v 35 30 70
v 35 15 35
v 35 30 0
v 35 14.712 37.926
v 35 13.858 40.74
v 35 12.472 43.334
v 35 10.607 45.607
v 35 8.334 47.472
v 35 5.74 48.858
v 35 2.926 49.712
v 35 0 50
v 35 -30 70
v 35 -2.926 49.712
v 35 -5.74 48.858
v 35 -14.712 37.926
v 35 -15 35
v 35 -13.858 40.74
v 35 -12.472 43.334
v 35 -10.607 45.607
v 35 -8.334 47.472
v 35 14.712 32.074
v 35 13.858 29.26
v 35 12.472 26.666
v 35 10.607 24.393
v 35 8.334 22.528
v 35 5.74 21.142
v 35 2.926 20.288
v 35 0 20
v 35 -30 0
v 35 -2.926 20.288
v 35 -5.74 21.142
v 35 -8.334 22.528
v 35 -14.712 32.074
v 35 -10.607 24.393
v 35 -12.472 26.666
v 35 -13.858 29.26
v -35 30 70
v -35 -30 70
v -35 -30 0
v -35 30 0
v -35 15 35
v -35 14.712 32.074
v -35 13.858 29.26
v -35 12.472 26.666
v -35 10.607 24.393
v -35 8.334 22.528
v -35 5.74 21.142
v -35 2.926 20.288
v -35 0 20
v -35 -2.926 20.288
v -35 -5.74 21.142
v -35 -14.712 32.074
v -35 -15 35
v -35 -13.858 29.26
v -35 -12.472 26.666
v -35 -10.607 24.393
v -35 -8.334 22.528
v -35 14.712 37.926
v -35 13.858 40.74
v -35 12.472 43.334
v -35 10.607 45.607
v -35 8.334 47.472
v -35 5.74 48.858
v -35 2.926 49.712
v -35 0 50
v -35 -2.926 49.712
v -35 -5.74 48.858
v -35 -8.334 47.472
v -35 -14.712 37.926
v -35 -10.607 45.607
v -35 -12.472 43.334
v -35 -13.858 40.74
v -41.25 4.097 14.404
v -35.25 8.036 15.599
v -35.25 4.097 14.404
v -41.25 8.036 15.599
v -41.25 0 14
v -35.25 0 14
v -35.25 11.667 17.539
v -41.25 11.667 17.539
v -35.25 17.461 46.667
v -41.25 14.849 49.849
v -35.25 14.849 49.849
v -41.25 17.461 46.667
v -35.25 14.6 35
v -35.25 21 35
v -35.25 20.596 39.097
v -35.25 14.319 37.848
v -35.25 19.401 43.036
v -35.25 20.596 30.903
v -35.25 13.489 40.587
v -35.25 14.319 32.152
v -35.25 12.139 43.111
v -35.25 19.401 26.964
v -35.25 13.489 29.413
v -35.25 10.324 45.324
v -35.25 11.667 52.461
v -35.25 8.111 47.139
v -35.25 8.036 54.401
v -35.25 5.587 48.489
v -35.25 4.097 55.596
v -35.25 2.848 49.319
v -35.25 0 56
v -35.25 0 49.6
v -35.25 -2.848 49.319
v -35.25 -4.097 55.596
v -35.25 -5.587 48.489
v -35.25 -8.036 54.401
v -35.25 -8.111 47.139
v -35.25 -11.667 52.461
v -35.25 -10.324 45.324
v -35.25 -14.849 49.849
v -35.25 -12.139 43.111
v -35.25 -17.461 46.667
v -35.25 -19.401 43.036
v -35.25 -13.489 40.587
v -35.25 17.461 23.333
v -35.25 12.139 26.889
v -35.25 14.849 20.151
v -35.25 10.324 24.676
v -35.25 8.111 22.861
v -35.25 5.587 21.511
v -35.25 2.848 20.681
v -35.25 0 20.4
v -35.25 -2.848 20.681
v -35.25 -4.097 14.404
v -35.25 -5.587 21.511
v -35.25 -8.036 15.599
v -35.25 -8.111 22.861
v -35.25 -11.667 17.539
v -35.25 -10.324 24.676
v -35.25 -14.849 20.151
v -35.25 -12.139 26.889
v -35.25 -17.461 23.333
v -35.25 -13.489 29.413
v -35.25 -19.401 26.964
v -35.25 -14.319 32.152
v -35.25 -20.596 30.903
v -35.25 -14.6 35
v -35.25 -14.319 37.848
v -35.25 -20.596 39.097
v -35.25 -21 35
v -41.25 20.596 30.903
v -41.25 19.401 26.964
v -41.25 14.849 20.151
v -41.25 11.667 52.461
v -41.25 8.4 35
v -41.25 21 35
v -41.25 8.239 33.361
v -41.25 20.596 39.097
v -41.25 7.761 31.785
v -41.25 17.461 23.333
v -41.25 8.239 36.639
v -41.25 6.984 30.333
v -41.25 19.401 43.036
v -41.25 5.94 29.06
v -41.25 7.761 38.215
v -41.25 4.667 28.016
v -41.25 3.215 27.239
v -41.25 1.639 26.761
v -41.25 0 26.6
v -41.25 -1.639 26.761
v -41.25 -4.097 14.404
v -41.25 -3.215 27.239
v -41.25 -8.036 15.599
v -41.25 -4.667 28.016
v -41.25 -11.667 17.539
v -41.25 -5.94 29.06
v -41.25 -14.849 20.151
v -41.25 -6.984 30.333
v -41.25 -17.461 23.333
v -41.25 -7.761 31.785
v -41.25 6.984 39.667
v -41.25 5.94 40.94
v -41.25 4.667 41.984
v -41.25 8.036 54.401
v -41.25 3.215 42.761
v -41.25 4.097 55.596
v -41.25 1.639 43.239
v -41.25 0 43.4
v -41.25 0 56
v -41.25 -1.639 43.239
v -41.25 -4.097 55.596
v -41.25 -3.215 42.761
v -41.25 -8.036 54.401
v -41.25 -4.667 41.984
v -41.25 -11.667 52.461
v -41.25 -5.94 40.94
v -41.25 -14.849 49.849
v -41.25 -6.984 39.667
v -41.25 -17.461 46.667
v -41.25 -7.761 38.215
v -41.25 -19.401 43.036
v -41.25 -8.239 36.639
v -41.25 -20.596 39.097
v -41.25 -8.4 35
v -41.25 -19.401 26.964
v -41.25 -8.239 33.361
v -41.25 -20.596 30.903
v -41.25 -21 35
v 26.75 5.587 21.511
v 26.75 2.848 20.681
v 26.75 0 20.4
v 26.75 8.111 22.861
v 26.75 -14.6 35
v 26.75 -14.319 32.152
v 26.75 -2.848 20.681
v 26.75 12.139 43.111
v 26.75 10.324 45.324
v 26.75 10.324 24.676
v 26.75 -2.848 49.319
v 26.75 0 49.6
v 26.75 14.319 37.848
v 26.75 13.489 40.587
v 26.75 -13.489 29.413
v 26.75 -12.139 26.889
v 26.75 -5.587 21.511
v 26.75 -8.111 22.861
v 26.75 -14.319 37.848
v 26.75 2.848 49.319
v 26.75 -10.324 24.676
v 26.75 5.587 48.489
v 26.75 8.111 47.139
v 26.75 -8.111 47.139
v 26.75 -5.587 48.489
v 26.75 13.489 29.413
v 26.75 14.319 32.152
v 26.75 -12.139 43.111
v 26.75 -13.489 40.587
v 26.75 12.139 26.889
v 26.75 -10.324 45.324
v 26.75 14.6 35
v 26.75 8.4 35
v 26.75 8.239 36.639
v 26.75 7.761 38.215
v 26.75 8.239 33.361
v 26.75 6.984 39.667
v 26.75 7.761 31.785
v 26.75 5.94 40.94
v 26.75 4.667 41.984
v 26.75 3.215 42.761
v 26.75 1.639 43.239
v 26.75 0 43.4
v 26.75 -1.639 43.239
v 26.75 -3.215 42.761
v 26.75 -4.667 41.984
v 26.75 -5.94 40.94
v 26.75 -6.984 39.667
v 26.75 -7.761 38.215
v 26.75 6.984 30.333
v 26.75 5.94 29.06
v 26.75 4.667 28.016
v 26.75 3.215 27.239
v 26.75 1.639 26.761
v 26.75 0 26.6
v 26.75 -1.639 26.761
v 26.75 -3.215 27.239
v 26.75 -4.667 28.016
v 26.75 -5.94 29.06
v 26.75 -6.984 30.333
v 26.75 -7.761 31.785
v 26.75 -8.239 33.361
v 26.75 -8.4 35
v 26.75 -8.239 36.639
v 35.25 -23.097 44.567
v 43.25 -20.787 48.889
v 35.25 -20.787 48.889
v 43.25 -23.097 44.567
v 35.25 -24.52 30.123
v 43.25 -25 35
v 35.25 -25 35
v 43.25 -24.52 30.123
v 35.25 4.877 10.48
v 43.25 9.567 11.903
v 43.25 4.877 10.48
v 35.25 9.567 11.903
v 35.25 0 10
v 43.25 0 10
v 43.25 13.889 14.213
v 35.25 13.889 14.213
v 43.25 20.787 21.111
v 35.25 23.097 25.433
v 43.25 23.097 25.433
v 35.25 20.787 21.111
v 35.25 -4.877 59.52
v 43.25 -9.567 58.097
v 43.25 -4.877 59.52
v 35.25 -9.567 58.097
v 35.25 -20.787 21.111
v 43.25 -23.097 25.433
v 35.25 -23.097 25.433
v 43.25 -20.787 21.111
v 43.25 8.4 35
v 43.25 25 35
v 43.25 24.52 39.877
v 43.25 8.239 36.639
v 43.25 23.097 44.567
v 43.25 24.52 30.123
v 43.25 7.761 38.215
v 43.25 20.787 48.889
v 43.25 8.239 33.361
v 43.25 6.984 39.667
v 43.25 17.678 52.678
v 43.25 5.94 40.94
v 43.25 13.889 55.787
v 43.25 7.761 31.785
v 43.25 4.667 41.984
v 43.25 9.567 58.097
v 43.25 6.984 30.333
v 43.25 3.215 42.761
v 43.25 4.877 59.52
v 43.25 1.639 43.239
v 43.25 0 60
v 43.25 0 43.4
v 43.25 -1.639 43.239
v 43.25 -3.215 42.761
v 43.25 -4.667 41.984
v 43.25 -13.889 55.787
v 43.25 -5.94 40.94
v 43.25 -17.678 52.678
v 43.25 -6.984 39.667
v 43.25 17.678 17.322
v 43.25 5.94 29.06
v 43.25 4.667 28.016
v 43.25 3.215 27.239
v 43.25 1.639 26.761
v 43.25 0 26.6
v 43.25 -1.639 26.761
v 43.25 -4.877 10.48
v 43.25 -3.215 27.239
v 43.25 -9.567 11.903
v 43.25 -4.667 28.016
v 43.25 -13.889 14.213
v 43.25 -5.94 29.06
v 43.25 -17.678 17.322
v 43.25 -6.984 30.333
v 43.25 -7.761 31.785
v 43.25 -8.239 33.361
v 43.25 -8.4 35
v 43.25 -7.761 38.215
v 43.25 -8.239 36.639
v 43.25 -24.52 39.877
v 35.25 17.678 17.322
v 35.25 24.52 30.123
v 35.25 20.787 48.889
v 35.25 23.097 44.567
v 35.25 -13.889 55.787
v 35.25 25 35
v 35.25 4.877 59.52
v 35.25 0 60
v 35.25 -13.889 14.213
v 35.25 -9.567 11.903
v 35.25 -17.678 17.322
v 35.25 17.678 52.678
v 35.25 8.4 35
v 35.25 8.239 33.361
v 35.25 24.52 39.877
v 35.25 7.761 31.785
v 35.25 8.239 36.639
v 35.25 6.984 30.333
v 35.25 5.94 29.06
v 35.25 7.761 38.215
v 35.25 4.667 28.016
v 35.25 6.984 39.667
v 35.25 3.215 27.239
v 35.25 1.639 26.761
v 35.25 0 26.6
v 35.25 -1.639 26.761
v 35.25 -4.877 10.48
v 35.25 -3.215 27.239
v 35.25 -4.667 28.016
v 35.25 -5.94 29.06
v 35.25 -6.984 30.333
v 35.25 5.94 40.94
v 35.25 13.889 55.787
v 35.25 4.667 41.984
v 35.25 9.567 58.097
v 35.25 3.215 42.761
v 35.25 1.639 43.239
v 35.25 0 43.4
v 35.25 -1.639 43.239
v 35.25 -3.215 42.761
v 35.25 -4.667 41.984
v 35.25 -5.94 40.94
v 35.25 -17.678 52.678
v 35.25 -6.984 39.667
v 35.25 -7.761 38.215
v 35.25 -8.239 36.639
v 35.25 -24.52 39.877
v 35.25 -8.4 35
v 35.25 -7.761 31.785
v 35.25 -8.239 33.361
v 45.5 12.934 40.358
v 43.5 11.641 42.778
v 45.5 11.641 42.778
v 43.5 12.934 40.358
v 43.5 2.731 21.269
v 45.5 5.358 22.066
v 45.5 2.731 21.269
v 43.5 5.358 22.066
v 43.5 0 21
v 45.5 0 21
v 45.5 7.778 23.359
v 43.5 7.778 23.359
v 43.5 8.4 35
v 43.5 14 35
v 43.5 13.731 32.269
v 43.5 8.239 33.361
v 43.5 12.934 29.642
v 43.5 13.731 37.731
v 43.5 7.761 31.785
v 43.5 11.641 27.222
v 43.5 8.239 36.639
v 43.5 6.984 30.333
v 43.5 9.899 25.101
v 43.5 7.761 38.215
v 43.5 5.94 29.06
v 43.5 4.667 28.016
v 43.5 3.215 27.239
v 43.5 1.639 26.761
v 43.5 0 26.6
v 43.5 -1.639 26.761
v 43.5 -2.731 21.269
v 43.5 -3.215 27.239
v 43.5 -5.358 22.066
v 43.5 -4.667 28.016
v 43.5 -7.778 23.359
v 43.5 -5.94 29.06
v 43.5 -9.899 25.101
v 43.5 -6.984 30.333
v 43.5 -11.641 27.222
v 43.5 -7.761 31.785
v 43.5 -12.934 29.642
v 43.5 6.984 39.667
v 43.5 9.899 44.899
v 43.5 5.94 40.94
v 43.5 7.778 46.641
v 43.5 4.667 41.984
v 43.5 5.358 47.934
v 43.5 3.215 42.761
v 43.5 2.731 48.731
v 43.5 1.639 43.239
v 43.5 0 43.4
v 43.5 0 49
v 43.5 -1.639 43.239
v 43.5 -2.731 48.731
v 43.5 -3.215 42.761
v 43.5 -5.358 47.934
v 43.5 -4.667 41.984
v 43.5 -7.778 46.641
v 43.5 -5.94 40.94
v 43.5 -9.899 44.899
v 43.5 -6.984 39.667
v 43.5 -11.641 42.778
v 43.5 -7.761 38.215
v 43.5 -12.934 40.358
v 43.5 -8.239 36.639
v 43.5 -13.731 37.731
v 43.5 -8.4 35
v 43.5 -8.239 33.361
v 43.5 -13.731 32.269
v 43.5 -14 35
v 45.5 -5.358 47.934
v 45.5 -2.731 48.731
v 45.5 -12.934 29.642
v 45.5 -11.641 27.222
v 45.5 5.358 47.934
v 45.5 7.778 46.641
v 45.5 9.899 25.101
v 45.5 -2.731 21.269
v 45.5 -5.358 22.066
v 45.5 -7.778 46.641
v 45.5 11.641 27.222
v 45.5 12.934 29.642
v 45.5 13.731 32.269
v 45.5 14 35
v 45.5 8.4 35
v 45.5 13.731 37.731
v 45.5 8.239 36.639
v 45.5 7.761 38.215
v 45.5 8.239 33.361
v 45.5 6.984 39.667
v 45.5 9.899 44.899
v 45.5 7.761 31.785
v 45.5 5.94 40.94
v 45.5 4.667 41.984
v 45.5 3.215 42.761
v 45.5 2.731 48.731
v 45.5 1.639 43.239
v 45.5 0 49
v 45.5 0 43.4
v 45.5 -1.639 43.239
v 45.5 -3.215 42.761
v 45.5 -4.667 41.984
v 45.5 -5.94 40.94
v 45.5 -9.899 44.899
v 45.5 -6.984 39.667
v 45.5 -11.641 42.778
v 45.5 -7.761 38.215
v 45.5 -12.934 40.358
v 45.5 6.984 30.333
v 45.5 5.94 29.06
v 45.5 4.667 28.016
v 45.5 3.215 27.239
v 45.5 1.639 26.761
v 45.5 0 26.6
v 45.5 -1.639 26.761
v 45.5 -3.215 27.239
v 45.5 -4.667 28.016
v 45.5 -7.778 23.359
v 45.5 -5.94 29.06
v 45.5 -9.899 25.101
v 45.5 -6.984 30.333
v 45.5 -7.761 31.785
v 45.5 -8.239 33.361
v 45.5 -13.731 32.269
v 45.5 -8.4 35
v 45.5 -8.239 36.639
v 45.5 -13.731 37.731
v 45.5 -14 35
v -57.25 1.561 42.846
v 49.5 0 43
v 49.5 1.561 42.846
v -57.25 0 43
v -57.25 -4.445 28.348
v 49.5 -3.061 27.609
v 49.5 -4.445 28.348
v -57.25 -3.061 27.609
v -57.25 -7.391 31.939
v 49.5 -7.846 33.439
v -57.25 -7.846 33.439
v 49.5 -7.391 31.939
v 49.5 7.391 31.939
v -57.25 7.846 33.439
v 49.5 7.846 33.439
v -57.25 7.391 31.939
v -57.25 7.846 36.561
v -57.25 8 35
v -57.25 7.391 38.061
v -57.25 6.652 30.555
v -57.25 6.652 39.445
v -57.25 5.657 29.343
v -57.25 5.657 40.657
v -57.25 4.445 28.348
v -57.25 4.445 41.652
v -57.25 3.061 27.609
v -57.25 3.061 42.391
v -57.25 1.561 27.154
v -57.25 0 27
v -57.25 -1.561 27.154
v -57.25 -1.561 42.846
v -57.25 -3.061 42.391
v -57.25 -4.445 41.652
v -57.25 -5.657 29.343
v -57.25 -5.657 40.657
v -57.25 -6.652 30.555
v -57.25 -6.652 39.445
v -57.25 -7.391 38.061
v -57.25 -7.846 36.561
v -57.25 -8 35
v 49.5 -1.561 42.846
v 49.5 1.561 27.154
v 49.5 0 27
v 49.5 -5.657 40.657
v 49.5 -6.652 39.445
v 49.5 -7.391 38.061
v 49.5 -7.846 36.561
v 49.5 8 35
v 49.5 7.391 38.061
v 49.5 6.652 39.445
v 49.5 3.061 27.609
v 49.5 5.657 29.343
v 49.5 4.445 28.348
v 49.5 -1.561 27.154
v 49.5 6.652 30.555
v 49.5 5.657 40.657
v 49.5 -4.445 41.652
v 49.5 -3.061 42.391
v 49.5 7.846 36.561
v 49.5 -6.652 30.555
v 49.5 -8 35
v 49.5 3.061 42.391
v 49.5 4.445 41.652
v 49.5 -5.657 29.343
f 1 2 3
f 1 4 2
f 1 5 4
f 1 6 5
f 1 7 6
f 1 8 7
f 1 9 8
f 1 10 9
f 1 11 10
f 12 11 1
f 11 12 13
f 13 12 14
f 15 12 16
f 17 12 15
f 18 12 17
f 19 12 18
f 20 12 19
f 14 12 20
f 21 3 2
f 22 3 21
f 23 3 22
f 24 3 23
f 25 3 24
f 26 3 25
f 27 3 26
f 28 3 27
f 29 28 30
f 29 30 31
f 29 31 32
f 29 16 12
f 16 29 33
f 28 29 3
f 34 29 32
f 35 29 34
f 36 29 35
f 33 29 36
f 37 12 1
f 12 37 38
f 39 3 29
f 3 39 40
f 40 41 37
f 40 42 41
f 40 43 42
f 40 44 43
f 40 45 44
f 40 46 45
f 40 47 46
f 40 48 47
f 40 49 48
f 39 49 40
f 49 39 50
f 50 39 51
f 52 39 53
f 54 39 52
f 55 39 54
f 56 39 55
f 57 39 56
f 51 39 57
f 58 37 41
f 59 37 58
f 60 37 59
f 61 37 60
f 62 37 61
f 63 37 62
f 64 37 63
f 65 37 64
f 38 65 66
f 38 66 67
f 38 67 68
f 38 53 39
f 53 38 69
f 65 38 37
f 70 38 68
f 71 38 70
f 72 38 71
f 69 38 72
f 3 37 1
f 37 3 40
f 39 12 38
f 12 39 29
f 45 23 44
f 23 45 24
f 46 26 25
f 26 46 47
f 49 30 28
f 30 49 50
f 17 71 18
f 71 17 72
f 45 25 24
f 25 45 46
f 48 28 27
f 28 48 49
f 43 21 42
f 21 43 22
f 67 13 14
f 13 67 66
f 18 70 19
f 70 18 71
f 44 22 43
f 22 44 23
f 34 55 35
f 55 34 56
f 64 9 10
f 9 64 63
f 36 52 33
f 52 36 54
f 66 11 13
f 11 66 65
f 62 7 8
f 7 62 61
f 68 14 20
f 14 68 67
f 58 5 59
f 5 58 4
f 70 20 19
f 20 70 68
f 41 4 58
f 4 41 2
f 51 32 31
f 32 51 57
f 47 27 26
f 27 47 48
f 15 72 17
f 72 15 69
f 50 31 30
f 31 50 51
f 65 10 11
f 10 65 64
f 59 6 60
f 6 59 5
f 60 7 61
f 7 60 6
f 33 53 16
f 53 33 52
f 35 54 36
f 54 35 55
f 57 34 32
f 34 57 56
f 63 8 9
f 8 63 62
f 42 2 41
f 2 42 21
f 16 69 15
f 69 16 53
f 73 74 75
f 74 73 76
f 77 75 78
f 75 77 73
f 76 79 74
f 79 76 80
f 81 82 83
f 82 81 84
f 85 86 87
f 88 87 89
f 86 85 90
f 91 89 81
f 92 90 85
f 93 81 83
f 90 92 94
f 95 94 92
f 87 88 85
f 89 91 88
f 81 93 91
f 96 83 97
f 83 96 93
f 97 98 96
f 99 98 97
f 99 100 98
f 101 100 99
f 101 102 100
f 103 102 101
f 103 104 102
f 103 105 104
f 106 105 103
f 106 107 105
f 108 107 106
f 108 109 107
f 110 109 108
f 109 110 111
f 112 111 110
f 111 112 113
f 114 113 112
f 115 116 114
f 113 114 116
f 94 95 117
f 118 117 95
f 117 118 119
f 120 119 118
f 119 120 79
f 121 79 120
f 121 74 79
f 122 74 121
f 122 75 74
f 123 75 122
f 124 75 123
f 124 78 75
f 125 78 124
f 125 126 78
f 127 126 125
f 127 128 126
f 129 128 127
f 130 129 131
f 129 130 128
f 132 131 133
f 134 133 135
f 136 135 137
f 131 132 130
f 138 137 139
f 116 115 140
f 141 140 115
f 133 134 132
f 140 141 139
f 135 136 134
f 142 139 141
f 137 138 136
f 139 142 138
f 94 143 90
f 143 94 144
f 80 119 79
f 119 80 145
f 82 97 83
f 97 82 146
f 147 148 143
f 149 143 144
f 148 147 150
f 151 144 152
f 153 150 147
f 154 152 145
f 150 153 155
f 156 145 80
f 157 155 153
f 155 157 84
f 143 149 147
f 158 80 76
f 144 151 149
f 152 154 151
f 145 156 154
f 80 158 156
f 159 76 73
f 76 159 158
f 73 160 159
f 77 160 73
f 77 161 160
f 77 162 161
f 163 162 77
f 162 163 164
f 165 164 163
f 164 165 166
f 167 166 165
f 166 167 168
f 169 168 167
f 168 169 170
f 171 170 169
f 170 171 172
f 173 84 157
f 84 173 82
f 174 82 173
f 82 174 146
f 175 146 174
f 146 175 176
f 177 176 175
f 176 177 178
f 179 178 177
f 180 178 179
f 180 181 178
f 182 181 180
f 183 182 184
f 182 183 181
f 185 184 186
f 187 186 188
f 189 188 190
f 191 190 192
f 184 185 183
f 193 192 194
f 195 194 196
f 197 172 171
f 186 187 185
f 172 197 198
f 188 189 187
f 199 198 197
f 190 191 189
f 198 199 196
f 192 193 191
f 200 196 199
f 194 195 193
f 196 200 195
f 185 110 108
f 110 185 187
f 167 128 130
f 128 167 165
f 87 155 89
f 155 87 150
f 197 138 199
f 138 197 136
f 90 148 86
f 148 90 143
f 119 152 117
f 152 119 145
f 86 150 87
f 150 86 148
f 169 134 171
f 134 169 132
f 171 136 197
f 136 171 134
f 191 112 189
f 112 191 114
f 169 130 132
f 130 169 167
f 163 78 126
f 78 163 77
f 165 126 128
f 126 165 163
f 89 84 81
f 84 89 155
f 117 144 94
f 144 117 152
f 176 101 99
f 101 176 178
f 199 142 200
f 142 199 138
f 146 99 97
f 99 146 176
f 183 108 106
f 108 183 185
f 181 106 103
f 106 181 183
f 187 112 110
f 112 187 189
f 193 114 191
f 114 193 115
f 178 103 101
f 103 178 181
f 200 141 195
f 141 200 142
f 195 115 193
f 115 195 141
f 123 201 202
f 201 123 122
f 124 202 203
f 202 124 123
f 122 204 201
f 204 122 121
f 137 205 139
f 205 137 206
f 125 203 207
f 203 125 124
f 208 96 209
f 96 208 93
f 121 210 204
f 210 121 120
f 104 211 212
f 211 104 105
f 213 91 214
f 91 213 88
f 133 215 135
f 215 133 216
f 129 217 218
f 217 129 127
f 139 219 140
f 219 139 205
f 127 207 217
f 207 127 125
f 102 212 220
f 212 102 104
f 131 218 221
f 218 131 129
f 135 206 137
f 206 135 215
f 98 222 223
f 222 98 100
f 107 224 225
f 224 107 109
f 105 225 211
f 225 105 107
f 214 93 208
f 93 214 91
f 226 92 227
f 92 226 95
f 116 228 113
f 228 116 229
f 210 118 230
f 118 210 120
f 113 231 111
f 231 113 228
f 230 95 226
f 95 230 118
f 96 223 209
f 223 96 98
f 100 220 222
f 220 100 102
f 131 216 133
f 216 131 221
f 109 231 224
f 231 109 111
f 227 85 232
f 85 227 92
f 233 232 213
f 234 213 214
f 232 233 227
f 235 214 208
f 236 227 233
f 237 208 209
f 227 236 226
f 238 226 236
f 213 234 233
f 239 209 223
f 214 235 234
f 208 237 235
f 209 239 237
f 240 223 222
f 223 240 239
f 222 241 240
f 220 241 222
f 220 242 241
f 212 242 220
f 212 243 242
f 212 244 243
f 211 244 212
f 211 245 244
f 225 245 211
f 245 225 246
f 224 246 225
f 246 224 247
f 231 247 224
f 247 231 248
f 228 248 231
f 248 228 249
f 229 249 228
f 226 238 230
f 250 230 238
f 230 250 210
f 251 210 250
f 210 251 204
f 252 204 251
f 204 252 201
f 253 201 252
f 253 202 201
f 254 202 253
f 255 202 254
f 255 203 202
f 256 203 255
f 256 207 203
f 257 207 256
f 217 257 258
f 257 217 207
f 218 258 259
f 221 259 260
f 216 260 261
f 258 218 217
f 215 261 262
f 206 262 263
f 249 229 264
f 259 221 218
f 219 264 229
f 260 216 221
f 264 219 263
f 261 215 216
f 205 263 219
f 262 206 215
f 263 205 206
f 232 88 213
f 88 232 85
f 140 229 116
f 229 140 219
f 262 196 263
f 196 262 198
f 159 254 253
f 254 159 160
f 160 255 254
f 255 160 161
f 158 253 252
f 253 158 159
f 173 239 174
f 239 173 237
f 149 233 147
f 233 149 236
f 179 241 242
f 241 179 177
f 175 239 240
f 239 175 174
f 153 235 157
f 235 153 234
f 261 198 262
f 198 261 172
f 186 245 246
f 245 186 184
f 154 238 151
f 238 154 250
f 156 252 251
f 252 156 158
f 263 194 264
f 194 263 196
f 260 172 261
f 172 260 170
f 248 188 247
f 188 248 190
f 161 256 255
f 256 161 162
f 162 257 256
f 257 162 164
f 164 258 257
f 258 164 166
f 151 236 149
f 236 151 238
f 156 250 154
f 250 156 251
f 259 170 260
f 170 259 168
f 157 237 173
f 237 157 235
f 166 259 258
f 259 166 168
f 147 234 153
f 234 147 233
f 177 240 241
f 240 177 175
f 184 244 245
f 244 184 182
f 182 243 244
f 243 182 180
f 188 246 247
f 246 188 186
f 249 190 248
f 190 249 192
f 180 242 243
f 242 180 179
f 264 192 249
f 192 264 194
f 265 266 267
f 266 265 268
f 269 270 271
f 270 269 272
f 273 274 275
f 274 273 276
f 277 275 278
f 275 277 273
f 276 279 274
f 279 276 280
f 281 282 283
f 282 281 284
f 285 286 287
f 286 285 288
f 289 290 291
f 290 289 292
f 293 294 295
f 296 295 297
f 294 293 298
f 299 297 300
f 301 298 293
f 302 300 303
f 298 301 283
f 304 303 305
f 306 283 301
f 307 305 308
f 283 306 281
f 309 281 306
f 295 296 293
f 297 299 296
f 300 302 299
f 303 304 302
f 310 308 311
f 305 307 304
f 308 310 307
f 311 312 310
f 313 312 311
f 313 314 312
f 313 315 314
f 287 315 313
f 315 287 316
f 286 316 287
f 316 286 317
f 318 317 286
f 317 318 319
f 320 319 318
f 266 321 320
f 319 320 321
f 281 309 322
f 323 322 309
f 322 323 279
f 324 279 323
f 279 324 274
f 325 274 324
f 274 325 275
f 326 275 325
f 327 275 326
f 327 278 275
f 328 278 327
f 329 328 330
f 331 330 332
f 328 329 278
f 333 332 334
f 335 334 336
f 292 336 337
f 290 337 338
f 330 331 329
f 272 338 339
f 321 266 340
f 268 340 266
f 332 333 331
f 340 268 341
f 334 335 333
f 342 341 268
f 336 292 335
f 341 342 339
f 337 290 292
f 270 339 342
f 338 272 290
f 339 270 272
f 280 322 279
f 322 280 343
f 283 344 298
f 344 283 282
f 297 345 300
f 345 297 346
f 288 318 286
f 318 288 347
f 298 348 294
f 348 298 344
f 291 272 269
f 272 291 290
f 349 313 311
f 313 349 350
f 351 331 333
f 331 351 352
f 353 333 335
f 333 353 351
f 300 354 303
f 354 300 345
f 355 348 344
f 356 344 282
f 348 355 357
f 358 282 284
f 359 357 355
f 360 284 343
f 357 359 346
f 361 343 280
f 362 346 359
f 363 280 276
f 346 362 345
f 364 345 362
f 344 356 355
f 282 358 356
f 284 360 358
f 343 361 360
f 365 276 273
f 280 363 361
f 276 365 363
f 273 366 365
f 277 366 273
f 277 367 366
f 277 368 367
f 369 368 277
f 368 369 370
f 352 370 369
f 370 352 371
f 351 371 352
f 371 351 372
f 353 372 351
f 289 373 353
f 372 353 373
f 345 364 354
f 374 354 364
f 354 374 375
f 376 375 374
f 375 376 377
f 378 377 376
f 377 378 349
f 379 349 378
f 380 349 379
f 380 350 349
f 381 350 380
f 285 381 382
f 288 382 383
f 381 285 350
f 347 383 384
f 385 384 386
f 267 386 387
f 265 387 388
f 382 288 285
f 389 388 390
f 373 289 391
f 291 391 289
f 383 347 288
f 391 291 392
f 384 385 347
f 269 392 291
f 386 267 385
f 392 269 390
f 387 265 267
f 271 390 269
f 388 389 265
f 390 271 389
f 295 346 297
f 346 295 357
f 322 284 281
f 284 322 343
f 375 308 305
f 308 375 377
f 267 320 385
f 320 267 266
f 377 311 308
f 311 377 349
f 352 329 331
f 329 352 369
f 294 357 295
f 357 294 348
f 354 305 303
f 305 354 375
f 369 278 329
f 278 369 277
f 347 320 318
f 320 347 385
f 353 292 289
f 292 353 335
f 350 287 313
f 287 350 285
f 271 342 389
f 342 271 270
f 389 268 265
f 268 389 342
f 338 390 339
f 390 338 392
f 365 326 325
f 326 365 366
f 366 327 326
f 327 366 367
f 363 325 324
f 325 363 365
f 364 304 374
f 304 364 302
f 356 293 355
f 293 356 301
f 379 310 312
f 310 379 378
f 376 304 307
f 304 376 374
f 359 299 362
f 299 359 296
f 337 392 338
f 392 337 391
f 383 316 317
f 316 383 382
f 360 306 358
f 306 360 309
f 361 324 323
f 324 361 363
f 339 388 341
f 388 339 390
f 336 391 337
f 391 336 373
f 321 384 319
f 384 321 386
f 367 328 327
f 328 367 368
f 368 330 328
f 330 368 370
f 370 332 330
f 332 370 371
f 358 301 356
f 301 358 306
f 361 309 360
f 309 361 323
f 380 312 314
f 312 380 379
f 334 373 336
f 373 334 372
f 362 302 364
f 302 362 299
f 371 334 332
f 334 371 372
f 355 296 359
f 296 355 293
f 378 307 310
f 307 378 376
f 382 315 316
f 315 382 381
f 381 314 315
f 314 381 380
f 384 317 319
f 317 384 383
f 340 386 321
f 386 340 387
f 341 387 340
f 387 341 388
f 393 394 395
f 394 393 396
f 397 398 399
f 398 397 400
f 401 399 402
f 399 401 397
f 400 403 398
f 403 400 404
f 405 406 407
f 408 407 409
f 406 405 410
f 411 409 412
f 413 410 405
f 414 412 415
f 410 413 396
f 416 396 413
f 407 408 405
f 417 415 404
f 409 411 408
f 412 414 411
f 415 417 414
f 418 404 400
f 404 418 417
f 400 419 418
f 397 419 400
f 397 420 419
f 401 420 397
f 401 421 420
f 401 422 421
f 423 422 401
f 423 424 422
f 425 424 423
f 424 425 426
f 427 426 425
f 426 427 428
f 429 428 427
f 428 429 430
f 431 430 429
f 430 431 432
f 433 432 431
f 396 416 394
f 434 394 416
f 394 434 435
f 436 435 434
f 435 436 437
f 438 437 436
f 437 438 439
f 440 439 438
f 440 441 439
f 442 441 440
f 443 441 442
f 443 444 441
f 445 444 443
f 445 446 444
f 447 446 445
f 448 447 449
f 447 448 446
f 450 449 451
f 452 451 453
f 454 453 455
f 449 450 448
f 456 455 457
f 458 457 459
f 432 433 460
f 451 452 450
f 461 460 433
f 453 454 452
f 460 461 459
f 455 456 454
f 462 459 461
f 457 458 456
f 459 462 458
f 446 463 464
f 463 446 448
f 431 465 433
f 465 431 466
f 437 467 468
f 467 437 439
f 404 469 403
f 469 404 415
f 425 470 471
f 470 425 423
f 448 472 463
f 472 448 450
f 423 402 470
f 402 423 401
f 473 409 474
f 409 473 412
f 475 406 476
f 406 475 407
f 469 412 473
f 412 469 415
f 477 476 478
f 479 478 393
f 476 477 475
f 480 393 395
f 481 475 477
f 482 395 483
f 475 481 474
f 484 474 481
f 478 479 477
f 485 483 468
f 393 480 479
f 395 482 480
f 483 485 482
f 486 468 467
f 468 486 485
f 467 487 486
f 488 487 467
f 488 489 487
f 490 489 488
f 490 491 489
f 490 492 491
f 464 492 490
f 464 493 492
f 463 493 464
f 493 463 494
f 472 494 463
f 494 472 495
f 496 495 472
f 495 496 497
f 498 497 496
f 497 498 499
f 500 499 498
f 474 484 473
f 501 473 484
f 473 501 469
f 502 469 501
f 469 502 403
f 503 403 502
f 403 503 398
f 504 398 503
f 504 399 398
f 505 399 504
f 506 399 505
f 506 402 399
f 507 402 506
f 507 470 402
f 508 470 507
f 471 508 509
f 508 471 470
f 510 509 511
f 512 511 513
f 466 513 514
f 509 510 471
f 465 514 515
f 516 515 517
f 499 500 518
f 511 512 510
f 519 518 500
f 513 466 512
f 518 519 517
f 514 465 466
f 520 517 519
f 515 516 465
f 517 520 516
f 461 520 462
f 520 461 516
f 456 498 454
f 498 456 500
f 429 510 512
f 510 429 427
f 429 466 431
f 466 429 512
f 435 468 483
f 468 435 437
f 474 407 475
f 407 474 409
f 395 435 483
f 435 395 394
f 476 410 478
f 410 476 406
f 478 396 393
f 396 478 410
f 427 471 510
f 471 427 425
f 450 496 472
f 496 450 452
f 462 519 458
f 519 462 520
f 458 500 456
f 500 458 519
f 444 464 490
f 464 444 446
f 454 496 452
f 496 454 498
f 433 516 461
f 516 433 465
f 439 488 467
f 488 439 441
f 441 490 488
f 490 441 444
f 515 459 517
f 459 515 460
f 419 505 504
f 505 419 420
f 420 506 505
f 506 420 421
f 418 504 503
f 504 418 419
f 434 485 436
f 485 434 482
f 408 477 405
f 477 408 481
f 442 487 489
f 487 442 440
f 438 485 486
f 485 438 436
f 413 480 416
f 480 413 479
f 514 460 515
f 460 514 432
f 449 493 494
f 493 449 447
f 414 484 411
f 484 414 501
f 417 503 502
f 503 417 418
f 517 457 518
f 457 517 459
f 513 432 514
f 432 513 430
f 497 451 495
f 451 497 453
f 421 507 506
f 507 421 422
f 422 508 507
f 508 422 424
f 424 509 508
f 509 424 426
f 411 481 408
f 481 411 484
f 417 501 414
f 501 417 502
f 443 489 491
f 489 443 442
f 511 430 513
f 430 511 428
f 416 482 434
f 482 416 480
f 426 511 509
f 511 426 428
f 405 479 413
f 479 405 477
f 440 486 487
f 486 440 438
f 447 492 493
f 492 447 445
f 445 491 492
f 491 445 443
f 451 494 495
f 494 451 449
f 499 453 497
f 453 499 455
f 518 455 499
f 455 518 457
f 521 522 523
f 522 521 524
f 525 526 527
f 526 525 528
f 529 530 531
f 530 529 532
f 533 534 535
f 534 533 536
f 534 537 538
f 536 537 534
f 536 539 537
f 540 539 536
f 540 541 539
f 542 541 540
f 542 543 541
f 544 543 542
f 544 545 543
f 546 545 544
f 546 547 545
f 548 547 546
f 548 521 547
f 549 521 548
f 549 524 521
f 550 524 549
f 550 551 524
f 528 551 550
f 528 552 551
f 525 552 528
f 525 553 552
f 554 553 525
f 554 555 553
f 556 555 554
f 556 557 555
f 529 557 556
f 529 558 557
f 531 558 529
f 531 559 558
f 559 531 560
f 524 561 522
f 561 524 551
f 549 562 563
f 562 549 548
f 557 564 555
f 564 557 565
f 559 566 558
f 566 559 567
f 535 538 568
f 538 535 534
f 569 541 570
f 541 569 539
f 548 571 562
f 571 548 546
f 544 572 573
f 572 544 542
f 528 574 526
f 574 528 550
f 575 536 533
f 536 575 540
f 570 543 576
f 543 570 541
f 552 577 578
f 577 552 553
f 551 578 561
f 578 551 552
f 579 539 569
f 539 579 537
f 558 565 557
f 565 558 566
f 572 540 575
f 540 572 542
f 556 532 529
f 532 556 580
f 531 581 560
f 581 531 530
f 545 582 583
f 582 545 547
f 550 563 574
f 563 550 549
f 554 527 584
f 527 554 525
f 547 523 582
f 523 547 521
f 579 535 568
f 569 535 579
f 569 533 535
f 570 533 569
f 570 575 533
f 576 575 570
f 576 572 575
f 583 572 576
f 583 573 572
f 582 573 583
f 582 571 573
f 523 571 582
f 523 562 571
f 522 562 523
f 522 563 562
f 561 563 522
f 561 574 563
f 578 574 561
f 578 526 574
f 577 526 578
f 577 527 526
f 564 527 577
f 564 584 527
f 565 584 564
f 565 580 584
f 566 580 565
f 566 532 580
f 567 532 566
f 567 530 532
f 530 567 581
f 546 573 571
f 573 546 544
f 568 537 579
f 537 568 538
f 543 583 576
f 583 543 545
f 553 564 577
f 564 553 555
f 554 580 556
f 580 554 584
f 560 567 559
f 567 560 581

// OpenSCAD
$fn = 32;

// ------------------------------------------------------------------------
// Bushed housing: 70 x 60 x 70 mm housing, bushing d29.2
// Every part is its own module, assembly() places them once.
// ------------------------------------------------------------------------

// --- part 1 ---
module housing() {
  difference() {
    translate([-35, -30, 0]) cube([70, 60, 70]);
    translate([0, 0, 35]) rotate([0, 90, 0]) cylinder(h = 72, d = 30, center = true);
  }
}

// --- part 2 ---
module bushing() {
  difference() {
    union() {
      cylinder(h = 6, d = 42);
      translate([0, 0, 6]) cylinder(h = 62, d = 29.2);
    }
    translate([0, 0, -1]) cylinder(h = 70, d = 16.8);
  }
}

// --- part 3 ---
module shaft() {
  translate([0, 0, -53.375]) cylinder(h = 106.75, d = 16);
}

// --- part 4 ---
module cover() {
  difference() {
    cylinder(h = 8, d = 50);
    translate([0, 0, -1]) cylinder(h = 10, d = 16.8);
  }
}

// --- part 5 ---
module washer() {
  difference() {
      translate([0, 0, 0]) cylinder(h = 2, d = 28);
      translate([0, 0, -1]) cylinder(h = 4, d = 16.8);
    }
}

// --- assembly ---
module assembly() {
  translate([0, 0, 0]) rotate([0, 0, 0]) housing();
  translate([-41.25, 0, 35]) rotate([0, 90, 0]) bushing();
  translate([-3.875, 0, 35]) rotate([0, 90, 0]) shaft();
  translate([35.25, 0, 35]) rotate([0, 90, 0]) cover();
  translate([43.5, 0, 35]) rotate([0, 90, 0]) washer();
}

assembly();
